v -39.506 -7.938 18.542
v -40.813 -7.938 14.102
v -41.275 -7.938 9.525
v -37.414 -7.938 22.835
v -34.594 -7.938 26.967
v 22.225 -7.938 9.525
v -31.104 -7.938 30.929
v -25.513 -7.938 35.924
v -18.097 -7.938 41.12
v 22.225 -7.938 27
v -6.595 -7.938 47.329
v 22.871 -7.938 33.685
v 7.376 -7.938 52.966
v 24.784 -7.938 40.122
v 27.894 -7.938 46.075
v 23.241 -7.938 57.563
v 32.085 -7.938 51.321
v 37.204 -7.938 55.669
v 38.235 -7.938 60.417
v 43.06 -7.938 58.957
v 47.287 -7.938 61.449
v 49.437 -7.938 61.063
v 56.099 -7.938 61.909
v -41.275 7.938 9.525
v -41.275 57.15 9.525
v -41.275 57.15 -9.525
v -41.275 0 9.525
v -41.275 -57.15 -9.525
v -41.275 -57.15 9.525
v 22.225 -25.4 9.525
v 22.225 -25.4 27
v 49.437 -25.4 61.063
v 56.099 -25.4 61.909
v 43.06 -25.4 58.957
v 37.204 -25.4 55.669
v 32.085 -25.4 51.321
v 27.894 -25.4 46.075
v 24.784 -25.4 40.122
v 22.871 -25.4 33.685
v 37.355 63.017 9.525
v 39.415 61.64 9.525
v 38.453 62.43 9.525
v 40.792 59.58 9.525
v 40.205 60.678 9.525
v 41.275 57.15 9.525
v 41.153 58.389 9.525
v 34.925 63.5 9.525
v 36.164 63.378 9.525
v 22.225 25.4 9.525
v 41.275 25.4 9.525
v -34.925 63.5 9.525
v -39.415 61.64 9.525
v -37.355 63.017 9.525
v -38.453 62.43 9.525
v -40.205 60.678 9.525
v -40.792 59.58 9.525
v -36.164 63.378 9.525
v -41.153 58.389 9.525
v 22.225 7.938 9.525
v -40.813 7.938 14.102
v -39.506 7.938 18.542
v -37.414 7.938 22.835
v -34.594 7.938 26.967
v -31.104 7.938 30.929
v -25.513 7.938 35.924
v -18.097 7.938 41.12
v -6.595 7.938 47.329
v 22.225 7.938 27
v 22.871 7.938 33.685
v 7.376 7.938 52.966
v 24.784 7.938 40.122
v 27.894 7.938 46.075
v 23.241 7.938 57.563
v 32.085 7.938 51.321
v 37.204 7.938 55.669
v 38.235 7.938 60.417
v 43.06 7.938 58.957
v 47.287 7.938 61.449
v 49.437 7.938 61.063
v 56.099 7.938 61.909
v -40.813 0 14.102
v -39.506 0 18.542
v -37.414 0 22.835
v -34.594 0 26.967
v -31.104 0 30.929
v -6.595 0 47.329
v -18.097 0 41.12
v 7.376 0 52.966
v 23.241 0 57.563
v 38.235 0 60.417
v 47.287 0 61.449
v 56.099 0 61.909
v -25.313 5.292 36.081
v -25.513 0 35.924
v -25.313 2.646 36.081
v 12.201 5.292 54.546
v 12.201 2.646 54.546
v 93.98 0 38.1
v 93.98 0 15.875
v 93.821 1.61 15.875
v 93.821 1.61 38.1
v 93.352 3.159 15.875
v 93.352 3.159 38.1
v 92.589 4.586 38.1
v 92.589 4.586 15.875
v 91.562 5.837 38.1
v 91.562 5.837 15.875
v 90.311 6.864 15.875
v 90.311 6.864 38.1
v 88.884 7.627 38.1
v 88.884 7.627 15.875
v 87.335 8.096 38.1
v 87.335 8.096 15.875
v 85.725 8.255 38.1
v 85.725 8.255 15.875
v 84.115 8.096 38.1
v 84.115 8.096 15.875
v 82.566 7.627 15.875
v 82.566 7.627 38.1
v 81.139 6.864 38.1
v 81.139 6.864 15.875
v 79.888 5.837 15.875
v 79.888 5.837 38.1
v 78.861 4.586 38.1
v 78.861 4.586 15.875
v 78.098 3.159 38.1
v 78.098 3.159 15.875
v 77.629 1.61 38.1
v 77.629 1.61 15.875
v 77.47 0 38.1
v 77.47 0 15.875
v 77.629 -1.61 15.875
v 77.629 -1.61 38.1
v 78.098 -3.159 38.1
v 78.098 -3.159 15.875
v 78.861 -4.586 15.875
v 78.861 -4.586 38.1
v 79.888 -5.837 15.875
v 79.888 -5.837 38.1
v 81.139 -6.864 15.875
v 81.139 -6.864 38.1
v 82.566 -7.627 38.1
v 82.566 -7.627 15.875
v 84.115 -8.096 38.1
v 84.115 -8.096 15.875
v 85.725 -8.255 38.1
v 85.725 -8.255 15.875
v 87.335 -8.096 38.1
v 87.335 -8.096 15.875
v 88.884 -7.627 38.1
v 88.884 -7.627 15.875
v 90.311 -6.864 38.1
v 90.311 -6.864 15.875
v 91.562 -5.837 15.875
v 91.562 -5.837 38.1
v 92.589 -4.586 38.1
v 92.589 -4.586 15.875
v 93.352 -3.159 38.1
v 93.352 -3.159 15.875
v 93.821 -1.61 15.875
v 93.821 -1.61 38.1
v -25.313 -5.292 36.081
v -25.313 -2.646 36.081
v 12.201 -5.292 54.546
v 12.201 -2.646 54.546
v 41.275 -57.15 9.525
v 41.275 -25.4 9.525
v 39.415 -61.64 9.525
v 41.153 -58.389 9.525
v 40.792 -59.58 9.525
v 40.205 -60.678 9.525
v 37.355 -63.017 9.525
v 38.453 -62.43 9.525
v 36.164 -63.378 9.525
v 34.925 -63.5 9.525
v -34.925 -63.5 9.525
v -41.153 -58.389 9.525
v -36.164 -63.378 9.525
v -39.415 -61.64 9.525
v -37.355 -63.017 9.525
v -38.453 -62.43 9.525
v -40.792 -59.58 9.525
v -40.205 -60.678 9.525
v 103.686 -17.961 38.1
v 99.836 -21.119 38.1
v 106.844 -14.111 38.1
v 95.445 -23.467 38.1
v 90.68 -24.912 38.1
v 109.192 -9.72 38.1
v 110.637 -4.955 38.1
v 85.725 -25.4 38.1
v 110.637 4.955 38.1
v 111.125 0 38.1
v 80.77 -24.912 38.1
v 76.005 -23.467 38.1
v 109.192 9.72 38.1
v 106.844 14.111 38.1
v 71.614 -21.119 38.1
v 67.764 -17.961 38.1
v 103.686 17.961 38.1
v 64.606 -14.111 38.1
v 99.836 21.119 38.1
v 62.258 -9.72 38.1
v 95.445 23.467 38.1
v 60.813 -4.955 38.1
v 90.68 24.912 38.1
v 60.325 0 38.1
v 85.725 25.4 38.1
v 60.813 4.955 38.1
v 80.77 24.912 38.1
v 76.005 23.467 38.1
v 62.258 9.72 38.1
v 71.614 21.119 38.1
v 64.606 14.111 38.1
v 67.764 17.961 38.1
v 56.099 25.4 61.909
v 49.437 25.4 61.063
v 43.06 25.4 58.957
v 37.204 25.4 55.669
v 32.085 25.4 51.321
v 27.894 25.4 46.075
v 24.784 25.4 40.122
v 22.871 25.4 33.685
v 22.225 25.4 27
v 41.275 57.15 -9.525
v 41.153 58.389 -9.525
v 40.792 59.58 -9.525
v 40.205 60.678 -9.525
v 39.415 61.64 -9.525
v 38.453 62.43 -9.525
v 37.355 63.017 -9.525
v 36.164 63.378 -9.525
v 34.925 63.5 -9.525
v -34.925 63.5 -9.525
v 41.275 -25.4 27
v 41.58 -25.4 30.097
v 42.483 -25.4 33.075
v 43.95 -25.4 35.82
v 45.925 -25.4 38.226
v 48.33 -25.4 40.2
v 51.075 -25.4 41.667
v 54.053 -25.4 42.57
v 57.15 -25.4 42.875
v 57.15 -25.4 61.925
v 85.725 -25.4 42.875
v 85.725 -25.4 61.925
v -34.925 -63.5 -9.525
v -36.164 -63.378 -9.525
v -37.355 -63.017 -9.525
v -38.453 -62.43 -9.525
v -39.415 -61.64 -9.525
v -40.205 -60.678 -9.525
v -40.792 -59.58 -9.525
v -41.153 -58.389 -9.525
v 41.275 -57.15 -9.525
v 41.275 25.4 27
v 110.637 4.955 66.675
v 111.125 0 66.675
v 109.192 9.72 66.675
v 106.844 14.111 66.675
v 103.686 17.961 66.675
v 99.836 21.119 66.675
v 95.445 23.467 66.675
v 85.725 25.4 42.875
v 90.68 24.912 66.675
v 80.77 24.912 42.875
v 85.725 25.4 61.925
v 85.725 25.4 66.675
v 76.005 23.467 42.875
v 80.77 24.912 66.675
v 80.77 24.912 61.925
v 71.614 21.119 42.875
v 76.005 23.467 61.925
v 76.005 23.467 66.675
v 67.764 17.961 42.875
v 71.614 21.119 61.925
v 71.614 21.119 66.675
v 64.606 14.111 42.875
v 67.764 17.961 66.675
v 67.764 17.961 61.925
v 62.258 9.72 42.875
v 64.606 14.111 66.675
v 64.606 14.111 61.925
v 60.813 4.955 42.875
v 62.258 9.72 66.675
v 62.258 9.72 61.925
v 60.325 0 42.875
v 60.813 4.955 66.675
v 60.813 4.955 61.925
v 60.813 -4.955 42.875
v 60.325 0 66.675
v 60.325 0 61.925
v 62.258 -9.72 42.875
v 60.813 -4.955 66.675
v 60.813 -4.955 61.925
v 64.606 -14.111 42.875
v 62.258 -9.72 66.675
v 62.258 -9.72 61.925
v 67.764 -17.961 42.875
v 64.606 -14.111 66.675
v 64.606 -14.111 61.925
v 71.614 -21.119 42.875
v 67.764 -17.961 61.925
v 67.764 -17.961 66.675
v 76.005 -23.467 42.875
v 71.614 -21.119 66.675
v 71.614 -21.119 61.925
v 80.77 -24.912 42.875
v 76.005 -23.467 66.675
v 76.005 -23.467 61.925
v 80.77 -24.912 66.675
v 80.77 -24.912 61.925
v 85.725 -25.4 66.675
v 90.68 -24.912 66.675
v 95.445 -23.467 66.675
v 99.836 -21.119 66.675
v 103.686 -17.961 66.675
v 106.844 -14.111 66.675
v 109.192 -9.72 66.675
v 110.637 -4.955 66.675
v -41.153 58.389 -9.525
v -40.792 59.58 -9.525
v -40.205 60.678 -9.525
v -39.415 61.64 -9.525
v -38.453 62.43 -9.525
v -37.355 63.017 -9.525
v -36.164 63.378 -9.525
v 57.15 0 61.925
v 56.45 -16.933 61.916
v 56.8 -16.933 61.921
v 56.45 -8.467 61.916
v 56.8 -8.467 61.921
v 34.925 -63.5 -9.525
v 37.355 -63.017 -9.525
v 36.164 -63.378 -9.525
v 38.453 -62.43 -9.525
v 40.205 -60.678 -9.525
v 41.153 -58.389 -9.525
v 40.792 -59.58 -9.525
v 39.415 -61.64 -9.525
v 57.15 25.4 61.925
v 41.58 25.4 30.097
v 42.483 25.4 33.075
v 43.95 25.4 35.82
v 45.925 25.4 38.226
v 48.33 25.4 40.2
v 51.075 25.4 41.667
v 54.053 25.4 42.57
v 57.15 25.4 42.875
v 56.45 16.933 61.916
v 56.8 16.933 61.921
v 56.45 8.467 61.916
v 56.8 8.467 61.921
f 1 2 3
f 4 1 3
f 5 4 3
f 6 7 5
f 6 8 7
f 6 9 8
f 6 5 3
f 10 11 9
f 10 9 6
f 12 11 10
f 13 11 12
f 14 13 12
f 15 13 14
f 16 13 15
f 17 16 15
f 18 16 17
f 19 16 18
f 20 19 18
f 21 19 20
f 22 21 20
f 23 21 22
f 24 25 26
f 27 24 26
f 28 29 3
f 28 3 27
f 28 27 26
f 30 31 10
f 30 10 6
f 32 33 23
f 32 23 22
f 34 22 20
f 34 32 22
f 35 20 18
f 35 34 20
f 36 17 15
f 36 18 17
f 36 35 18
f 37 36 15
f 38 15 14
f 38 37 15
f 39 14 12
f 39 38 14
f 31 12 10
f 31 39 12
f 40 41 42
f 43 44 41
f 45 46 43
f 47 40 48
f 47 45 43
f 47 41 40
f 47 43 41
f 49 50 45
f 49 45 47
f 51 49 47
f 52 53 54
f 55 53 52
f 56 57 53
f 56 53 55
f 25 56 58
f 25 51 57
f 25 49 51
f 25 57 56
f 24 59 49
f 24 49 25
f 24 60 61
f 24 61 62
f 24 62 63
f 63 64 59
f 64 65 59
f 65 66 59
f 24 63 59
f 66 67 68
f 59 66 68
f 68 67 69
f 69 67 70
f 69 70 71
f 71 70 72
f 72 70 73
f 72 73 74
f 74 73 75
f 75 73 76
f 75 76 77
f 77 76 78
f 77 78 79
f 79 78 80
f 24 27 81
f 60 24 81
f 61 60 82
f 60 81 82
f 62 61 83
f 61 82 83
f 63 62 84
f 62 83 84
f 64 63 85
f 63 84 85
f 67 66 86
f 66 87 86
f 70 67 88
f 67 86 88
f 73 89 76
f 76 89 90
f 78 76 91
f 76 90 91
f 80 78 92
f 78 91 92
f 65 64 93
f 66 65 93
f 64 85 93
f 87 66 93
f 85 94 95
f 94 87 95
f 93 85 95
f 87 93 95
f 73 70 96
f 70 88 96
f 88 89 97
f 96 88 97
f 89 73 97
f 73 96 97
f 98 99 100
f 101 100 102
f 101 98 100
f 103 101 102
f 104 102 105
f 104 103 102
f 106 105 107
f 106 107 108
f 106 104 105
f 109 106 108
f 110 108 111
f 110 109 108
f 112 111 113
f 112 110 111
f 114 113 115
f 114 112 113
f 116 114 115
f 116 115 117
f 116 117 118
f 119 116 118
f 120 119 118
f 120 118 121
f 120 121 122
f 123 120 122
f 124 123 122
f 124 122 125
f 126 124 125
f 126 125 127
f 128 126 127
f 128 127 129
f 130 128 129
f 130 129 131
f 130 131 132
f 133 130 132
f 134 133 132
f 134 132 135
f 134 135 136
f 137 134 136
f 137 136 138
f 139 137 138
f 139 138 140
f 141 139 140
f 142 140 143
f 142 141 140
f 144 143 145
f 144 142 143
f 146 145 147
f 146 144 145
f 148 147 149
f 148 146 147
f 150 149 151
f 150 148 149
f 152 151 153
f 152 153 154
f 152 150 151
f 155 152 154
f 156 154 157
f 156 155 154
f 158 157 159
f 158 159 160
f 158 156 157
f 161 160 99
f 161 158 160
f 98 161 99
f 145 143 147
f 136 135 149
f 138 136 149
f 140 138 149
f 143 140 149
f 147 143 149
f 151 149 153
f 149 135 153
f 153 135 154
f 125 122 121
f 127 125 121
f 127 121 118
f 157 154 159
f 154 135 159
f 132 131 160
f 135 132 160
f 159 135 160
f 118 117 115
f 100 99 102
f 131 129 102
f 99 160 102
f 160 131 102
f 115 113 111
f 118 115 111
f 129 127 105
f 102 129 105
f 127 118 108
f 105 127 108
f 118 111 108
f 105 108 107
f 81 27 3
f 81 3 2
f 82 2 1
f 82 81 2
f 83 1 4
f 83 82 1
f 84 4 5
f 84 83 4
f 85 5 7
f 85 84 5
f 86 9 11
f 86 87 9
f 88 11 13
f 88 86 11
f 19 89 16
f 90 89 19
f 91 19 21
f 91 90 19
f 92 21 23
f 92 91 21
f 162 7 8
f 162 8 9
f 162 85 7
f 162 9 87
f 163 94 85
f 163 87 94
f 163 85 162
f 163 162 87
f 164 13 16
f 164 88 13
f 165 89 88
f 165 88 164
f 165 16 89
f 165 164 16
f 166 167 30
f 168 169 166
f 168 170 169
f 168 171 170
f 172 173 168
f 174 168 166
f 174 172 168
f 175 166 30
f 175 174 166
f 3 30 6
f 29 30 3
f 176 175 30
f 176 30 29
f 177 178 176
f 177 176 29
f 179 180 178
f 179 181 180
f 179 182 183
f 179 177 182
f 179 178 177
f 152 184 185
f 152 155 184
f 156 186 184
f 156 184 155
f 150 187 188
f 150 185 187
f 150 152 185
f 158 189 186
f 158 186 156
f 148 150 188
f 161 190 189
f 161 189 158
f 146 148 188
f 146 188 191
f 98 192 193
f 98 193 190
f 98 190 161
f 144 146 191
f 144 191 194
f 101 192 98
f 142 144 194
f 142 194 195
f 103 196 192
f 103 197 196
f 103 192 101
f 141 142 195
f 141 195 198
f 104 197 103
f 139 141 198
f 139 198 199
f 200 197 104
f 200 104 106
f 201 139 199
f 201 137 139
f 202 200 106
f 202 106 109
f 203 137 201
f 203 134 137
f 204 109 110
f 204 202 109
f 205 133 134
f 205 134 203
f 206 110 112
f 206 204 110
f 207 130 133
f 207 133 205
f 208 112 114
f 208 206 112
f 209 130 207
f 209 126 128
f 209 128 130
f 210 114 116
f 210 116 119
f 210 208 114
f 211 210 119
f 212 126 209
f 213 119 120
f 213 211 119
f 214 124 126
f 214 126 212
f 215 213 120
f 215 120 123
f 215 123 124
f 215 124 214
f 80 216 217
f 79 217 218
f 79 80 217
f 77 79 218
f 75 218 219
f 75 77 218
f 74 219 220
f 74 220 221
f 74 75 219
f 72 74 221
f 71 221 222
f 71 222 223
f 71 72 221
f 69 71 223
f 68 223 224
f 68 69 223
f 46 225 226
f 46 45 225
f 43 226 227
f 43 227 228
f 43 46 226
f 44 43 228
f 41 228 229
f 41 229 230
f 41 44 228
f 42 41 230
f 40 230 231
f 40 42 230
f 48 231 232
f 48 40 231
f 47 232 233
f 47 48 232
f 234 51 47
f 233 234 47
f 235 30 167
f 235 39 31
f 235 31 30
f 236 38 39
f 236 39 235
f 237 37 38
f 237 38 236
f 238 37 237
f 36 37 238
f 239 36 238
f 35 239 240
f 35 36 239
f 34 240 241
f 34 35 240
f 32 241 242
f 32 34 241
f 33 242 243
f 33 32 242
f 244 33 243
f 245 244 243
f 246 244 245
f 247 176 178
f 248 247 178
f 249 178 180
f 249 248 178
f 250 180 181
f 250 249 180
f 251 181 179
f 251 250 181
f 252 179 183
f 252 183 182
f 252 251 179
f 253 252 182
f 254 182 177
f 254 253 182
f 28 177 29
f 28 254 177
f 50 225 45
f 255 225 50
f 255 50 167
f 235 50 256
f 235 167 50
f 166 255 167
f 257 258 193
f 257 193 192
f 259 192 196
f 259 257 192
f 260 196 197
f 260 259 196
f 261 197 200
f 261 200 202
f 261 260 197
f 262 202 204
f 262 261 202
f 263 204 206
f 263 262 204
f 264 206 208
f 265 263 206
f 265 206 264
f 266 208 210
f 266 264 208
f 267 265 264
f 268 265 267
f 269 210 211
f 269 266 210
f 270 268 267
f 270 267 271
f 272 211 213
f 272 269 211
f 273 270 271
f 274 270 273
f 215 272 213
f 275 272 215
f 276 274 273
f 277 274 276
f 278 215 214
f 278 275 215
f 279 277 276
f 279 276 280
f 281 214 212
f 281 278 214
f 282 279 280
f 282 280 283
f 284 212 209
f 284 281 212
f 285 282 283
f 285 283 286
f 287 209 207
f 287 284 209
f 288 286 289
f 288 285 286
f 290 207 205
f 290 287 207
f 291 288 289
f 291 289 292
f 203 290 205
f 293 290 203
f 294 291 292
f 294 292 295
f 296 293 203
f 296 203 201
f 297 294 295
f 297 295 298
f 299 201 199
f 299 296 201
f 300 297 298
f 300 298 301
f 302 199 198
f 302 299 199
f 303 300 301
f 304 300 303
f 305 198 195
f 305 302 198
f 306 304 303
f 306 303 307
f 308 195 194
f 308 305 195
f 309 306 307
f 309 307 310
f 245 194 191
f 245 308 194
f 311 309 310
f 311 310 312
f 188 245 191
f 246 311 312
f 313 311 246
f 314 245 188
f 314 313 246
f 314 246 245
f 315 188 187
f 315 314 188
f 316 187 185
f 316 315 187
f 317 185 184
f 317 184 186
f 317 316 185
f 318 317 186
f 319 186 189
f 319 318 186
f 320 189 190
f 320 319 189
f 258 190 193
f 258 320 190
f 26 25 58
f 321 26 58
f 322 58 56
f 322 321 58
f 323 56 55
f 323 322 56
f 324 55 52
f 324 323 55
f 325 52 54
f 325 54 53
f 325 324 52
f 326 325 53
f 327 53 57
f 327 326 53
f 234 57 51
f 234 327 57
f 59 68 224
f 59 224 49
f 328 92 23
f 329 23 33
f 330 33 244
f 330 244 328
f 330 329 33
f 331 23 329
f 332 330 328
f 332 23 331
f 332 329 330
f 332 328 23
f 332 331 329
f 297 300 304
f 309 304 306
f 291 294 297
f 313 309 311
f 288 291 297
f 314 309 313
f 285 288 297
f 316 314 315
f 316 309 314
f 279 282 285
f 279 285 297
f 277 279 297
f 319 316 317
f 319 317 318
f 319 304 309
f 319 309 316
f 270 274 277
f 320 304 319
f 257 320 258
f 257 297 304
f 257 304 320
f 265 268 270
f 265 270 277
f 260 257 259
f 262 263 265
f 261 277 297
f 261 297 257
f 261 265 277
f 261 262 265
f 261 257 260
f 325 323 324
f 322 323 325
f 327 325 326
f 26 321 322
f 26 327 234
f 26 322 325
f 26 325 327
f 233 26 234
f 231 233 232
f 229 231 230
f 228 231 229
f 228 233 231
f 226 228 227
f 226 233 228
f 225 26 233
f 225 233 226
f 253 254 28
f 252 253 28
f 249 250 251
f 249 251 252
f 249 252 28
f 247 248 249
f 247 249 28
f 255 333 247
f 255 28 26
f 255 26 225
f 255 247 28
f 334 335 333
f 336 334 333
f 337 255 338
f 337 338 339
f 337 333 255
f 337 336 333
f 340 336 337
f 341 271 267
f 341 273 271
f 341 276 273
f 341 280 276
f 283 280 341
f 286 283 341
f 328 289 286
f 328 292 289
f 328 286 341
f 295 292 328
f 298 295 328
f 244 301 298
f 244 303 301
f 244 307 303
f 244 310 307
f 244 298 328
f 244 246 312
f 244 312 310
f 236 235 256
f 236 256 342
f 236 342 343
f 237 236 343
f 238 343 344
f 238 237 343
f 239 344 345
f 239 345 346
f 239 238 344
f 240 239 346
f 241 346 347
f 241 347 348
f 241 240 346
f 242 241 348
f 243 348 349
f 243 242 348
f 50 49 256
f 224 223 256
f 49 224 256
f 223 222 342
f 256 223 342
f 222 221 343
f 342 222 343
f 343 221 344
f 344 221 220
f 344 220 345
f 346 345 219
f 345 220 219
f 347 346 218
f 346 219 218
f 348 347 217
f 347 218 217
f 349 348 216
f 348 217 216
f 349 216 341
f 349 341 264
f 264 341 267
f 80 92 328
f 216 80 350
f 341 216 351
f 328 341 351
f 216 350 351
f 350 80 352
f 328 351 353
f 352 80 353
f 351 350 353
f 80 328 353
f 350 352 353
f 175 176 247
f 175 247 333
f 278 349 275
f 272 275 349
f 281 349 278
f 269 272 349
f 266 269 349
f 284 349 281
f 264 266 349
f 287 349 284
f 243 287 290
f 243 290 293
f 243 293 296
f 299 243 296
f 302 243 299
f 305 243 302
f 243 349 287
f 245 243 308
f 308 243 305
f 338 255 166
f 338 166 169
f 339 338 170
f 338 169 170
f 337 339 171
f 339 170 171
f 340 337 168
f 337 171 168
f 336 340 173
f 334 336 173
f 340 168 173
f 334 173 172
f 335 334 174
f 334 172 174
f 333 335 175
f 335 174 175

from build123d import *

# Parameters (mm, degrees)
F1_DEPTH = 63.5
F2_DEPTH = 7.9375
F0_W     = 25.4
F0_H     = 19.05
F3_DEPTH = 25.4
F5_R     = 6.35
F6_R     = 8.255
F7_DEPTH = 50.8


with BuildPart() as f1:
    # F0 (on Front) → F1 (new body, symmetric)
    with BuildSketch(Plane.XZ):
        Polygon((41.275, -9.525), (41.275, 9.525), (22.225, 9.525), (-41.275, 9.525), (-41.275, -9.525), align=None)
    extrude(amount=F1_DEPTH, both=True)

    # F0 (on Front) → F2 (join, symmetric)
    with BuildSketch(Plane.XZ):
        with BuildLine():
            Line((-41.275, 9.525), (22.225, 9.525))
            Line((22.225, 9.525), (22.225, 27.0002))
            ThreePointArc((22.225, 27.0002), (32.085462505, 51.3214784443), (56.0989919922, 61.9093822758))
            add(Edge.make_bspline(
                [(-41.275, 9.525), (-41.1447664314, 39.122666143), (14.0637717718, 61.1012042417), (56.0989919922, 61.9093822758)],
                knots=[0, 0, 0, 0, 110.5804655627, 110.5804655627, 110.5804655627, 110.5804655627], degree=3))
        make_face()
    extrude(amount=F2_DEPTH, both=True)

    # F0 (on Front) → F3 (join, symmetric)
    with BuildSketch(Plane.XZ):
        with BuildLine():
            Line((22.225, 9.525), (41.275, 9.525))
            Line((41.275, 9.525), (41.275, 27.0002))
            ThreePointArc((41.275, 27.0002), (45.9246798487, 38.2255201513), (57.15, 42.8752))
            Line((57.15, 42.8752), (60.325, 42.8752))
            Line((60.325, 42.8752), (60.325, 61.9252))
            Line((60.325, 61.9252), (57.15, 61.9252))
            add(Edge.make_bspline(
                [(56.0989919922, 61.9093822758), (56.450261188, 61.9161358517), (56.8006104667, 61.9214110624), (57.15, 61.9252)],
                knots=[110.5804655627, 110.5804655627, 110.5804655627, 110.5804655627, 111.5045361635, 111.5045361635, 111.5045361635, 111.5045361635], degree=3))
            ThreePointArc((56.0989919922, 61.9093822758), (32.085462505, 51.3214784443), (22.225, 27.0002))
            Line((22.225, 27.0002), (22.225, 9.525))
        make_face()
        with Locations((73.025, 52.4002)):
            Rectangle(F0_W, F0_H)
    extrude(amount=F3_DEPTH, both=True)

    # F0 (on Front) → F4 (revolve)
    with BuildSketch(Plane.XZ):
        Polygon((85.725, 61.9252), (85.725, 42.8752), (85.725, 38.1), (111.125, 38.1), (111.125, 66.675), (85.725, 66.675), align=None)
    revolve(axis=Axis((85.725, 0, 52.3875), (0, 0, 1)))

    # F5
    f5_edges = [f1.edges().sort_by_distance(p)[0] for p in [
        (-41.275, -63.5, 0),
        (41.275, -63.5, 0),
        (41.275, 63.5, 0),
        (-41.275, 63.5, 0),
    ]]
    fillet(f5_edges, radius=F5_R)

    # F6 (on face) → F7 (join)
    with BuildSketch(Plane.XY.offset(66.675)):
        with Locations((85.725, 0)):
            Circle(F6_R)
    extrude(amount=-F7_DEPTH)


solid = f1.part
